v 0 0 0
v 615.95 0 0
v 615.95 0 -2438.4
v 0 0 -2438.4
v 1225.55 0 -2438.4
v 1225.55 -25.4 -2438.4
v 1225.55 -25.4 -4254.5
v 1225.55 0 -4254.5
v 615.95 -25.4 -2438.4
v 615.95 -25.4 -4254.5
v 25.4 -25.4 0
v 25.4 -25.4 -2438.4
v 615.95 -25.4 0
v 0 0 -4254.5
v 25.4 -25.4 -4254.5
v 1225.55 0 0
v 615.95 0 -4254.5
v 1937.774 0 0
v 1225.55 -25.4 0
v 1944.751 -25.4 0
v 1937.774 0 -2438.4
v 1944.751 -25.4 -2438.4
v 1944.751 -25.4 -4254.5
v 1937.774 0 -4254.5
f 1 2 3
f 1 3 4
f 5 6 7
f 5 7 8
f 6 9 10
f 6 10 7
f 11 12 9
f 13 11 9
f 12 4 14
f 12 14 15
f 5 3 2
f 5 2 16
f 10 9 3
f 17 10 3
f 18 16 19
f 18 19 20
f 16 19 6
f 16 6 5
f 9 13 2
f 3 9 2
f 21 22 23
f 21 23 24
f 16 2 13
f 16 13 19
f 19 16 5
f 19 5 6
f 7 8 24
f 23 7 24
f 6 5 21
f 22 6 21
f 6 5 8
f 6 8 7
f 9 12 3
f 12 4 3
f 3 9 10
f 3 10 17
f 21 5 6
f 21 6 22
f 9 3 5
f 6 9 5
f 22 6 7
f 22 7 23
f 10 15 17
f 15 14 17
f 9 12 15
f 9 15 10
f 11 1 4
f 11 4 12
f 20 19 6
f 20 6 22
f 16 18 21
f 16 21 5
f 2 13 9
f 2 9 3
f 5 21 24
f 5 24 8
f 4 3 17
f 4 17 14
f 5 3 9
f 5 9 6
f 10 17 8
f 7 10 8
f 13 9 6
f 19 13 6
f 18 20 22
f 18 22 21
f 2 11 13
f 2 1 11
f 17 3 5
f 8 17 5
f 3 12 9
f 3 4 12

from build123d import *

# Parameters (mm, degrees)
F1_DEPTH = 2438.4
F0_W     = 609.6
F0_H     = 25.4
F2_DEPTH = 2438.4
F3_DEPTH = 2438.4
F4_DEPTH = 1816.1
F5_DEPTH = 1816.1
F6_DEPTH = 1816.1


with BuildPart() as f1:
    # F0 (on Top) → F1 (new body)
    with BuildSketch(Plane.XY):
        Polygon((615.95, 0), (0, 0), (25.4, -25.4), (615.95, -25.4), align=None)
    extrude(amount=-F1_DEPTH)


with BuildPart() as f2:
    # F0 (on Top) → F2 (new body, through all)
    with BuildSketch(Plane.XY):
        with Locations((920.75, -12.7)):
            Rectangle(F0_W, F0_H)
    extrude(amount=-F2_DEPTH)


with BuildPart() as f3:
    # F0 (on Top) → F3 (new body, through all)
    with BuildSketch(Plane.XY):
        Polygon((1937.7737486287, 0), (1225.55, 0), (1225.55, -25.4), (1944.751, -25.4), align=None)
    extrude(amount=-F3_DEPTH)


with BuildPart() as f4:
    # F4 (new): a face of the model
    f4_faces = [f1.part.faces().sort_by_distance(p)[0] for p in [
        (314.2804385965, -12.610877193, -2438.4),
    ]]
    extrude(f4_faces, amount=F4_DEPTH)


with BuildPart() as f5:
    # F5 (new, through all): a face of the model
    f5_faces = [f2.part.faces().sort_by_distance(p)[0] for p in [
        (920.75, -12.7, -2438.4),
    ]]
    extrude(f5_faces, amount=F5_DEPTH)


with BuildPart() as f6:
    # F6 (new, through all): a face of the model
    f6_faces = [f3.part.faces().sort_by_distance(p)[0] for p in [
        (1583.409021282, -12.7206347074, -2438.4),
    ]]
    extrude(f6_faces, amount=F6_DEPTH)


solid = Compound([f1.part, f2.part, f3.part, f4.part, f5.part, f6.part])
